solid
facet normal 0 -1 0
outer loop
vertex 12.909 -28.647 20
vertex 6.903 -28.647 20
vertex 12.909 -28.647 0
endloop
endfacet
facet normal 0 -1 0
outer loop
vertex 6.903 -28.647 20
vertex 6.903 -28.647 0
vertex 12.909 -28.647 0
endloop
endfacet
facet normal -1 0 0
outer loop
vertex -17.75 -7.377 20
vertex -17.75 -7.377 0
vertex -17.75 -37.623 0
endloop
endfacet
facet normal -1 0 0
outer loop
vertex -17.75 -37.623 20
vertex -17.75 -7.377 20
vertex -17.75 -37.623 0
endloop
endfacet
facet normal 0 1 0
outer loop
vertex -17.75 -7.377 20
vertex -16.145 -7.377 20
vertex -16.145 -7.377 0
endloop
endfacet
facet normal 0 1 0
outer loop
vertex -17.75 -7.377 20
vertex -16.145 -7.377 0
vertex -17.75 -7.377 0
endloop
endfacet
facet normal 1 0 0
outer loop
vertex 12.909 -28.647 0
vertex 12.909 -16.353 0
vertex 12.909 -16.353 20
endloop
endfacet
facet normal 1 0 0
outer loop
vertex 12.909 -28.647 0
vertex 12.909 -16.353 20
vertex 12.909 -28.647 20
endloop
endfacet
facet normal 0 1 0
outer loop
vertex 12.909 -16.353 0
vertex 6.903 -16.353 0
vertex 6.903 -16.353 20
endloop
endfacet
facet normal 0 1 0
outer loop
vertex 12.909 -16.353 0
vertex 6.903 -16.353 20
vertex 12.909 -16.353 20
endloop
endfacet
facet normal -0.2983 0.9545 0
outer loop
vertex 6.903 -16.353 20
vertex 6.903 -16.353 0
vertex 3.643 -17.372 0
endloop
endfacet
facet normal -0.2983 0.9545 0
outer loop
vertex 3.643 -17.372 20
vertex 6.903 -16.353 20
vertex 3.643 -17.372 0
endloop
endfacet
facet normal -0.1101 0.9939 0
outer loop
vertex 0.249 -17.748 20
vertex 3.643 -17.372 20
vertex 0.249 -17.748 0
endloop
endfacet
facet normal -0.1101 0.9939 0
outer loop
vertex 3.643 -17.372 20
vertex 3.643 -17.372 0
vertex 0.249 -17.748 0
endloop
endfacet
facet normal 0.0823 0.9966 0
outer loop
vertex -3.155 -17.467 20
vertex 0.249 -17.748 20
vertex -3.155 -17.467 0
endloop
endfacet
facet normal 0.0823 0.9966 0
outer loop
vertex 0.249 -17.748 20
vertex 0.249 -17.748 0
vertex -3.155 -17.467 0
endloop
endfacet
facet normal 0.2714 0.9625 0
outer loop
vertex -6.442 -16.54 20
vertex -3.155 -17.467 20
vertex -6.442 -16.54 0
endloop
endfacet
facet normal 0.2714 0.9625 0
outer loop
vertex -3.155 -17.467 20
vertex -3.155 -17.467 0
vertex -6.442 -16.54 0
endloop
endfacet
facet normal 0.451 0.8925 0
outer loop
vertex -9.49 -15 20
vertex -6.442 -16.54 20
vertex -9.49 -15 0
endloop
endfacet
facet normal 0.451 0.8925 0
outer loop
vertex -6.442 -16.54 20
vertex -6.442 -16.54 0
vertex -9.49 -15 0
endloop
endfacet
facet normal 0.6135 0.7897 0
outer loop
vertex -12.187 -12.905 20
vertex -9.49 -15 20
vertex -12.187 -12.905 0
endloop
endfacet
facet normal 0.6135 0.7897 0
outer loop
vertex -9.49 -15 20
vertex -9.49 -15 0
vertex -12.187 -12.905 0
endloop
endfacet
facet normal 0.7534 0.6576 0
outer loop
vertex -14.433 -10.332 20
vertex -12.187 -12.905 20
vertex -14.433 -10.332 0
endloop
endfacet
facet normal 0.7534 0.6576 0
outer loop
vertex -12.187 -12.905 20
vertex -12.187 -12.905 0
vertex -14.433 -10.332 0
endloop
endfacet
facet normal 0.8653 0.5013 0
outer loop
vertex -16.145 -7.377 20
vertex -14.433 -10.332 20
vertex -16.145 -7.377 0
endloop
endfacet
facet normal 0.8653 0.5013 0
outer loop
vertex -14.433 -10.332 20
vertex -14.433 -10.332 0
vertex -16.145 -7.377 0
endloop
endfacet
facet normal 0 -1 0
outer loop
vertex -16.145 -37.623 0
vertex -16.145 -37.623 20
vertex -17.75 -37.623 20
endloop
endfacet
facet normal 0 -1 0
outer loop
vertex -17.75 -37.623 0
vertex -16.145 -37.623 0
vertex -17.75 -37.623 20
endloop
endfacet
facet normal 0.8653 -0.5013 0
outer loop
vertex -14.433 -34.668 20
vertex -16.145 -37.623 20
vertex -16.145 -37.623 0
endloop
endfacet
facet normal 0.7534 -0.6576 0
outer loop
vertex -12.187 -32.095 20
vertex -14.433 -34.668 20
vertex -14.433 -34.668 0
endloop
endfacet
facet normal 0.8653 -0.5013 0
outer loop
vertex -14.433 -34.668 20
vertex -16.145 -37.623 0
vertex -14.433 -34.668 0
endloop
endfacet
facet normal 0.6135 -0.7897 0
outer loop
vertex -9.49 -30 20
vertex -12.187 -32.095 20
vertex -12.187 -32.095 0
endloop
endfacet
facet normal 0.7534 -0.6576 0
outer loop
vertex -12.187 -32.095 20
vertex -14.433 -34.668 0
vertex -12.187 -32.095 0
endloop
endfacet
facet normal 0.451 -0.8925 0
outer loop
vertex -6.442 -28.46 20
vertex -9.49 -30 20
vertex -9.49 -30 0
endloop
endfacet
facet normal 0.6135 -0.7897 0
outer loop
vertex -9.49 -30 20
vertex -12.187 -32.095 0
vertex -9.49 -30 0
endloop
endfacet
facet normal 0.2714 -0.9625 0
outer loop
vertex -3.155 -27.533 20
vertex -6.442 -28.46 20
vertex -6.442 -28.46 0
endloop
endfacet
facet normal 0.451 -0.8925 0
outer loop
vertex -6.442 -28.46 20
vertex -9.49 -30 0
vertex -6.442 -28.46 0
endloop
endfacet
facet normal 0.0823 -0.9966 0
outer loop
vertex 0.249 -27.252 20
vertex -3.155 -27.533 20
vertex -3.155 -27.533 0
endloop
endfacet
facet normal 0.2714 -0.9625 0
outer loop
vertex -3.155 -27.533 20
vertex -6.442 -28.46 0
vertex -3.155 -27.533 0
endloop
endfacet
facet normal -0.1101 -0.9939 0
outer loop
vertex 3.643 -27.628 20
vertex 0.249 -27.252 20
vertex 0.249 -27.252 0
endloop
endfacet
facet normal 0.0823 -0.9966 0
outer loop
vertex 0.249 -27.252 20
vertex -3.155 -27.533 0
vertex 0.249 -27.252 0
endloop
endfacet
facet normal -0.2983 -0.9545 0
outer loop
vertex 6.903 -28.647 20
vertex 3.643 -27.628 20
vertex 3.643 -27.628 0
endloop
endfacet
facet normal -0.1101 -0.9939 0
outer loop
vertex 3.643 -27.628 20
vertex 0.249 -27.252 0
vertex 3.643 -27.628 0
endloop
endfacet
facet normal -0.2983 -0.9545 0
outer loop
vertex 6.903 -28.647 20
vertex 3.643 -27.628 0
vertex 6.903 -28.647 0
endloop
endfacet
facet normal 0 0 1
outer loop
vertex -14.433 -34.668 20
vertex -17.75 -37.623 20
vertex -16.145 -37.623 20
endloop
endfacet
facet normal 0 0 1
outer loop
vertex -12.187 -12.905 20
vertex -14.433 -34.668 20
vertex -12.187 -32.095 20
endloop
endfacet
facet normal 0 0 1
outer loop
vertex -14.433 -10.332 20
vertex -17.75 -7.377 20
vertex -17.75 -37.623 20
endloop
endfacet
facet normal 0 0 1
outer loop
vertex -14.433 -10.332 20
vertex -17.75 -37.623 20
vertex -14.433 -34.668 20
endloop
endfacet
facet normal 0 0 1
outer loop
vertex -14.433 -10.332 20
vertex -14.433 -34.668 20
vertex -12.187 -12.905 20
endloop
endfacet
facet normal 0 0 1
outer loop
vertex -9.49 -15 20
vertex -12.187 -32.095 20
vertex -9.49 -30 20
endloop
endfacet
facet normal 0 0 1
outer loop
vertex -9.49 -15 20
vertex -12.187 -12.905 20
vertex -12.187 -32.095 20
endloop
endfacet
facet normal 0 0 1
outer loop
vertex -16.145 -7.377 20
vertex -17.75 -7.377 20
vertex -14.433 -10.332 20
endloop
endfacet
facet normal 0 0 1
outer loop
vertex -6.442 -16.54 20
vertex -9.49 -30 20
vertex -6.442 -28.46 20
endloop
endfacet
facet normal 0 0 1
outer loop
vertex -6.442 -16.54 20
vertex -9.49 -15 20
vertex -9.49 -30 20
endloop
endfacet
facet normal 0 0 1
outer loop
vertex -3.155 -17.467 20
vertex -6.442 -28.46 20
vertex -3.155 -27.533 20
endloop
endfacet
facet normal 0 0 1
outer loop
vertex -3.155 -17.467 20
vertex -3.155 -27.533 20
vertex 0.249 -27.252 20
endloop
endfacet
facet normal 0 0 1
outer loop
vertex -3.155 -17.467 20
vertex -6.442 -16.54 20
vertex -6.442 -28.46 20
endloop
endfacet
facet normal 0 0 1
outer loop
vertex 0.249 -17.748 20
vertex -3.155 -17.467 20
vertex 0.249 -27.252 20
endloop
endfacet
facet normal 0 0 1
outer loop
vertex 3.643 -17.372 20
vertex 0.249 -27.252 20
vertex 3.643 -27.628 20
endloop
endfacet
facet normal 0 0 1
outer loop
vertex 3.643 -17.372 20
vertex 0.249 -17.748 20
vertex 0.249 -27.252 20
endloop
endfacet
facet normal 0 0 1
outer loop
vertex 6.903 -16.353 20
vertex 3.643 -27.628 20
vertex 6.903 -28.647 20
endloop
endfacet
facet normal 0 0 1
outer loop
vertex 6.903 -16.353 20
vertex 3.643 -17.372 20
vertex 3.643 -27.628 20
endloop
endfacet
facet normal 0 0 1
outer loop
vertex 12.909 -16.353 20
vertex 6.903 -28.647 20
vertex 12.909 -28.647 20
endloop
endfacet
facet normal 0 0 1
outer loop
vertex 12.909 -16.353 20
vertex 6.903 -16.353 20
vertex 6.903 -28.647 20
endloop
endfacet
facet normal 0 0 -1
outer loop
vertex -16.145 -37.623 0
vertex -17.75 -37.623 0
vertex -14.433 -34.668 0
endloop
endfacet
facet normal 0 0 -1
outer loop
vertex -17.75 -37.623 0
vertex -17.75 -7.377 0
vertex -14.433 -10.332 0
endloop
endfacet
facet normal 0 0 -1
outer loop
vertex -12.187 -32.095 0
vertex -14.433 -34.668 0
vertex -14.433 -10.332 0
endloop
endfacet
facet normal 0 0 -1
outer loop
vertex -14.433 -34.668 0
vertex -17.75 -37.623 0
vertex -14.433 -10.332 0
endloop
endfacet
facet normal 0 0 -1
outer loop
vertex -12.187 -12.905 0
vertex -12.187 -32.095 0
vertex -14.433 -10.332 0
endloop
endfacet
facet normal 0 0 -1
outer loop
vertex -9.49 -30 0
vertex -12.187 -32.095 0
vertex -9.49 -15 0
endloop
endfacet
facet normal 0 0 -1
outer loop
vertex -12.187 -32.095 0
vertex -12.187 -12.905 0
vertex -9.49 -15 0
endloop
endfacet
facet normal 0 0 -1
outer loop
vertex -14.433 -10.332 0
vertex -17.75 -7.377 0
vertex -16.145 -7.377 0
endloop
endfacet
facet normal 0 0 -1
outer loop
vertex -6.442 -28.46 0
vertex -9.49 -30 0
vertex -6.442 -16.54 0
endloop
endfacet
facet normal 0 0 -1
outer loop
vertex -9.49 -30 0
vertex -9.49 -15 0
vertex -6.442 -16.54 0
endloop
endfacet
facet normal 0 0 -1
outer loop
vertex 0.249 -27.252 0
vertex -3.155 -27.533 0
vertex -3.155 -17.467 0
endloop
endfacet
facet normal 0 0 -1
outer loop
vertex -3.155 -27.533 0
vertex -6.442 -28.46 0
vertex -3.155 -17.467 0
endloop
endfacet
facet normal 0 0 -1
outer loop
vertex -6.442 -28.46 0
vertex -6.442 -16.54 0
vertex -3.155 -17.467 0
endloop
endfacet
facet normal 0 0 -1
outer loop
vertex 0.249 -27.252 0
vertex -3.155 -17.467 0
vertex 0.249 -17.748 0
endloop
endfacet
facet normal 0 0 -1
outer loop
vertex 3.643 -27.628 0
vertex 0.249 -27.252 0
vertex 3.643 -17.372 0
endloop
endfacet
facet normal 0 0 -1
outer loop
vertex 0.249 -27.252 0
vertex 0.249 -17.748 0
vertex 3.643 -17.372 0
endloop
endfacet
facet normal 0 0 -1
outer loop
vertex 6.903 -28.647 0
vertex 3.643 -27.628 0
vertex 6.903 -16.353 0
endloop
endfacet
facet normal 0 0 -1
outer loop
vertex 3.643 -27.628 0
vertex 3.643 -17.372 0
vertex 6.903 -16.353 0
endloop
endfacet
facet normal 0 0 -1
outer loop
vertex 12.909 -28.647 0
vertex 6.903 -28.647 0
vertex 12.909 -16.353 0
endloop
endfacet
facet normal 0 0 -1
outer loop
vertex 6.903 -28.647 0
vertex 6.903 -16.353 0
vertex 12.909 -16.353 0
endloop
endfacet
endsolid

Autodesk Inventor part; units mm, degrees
ref_plane "YZ Plane" through (0, 0, 0) normal (1, 0, 0) x (0, 1, 0)
ref_plane "XZ Plane" through (0, 0, 0) normal (0, 1, 0) x (-1, 0, 0)
ref_plane "XY Plane" through (0, 0, 0) normal (0, 0, 1) x (1, 0, 0)
sketch "Эскиз1" plane through (0, 0, 0) normal (0, 0, 1) x (1, 0, 0)
  circle A0 centre (0, 0) radius 17.75
  line L0 (0, 0) -> (0, -45)
  circle A1 centre (0, -45) radius 17.75
  line L1 (12.9091, -12.1827) -> (12.9091, -32.8173)
  line L2 (-17.75, 0) -> (-17.75, -45)
  line L3 (9.8694, -14.7532) -> (14.166, -14.7532)
  line L4 (9.8694, -30.2468) -> (17.166, -30.2468)
  line L5 (-16.1446, -7.3766) -> (-17.75, -7.3766)
  line L6 (-16.1446, -37.6234) -> (-17.75, -37.6234)
  line L7 (6.9028, -16.3528) -> (15.2579, -16.3528)
  line L8 (6.9028, -28.6472) -> (17.9028, -28.6472)
  point P0 (12.9091, -30.2468)
  point P1 (12.9091, -14.7532)
  point P2 (12.9091, -28.6472)
  point P3 (12.9091, -16.3528)
  dimension "d0" = 35.5
  dimension "d1" = 45
  dimension "d2" = 35.5
extrude "Выдавливание1" add sketch "Эскиз1" along normal blind 20 contours A0 L0 A1 L6 L2 L5 | A0 L7 L1 L8 A1 L0
properties part number "распорка"
